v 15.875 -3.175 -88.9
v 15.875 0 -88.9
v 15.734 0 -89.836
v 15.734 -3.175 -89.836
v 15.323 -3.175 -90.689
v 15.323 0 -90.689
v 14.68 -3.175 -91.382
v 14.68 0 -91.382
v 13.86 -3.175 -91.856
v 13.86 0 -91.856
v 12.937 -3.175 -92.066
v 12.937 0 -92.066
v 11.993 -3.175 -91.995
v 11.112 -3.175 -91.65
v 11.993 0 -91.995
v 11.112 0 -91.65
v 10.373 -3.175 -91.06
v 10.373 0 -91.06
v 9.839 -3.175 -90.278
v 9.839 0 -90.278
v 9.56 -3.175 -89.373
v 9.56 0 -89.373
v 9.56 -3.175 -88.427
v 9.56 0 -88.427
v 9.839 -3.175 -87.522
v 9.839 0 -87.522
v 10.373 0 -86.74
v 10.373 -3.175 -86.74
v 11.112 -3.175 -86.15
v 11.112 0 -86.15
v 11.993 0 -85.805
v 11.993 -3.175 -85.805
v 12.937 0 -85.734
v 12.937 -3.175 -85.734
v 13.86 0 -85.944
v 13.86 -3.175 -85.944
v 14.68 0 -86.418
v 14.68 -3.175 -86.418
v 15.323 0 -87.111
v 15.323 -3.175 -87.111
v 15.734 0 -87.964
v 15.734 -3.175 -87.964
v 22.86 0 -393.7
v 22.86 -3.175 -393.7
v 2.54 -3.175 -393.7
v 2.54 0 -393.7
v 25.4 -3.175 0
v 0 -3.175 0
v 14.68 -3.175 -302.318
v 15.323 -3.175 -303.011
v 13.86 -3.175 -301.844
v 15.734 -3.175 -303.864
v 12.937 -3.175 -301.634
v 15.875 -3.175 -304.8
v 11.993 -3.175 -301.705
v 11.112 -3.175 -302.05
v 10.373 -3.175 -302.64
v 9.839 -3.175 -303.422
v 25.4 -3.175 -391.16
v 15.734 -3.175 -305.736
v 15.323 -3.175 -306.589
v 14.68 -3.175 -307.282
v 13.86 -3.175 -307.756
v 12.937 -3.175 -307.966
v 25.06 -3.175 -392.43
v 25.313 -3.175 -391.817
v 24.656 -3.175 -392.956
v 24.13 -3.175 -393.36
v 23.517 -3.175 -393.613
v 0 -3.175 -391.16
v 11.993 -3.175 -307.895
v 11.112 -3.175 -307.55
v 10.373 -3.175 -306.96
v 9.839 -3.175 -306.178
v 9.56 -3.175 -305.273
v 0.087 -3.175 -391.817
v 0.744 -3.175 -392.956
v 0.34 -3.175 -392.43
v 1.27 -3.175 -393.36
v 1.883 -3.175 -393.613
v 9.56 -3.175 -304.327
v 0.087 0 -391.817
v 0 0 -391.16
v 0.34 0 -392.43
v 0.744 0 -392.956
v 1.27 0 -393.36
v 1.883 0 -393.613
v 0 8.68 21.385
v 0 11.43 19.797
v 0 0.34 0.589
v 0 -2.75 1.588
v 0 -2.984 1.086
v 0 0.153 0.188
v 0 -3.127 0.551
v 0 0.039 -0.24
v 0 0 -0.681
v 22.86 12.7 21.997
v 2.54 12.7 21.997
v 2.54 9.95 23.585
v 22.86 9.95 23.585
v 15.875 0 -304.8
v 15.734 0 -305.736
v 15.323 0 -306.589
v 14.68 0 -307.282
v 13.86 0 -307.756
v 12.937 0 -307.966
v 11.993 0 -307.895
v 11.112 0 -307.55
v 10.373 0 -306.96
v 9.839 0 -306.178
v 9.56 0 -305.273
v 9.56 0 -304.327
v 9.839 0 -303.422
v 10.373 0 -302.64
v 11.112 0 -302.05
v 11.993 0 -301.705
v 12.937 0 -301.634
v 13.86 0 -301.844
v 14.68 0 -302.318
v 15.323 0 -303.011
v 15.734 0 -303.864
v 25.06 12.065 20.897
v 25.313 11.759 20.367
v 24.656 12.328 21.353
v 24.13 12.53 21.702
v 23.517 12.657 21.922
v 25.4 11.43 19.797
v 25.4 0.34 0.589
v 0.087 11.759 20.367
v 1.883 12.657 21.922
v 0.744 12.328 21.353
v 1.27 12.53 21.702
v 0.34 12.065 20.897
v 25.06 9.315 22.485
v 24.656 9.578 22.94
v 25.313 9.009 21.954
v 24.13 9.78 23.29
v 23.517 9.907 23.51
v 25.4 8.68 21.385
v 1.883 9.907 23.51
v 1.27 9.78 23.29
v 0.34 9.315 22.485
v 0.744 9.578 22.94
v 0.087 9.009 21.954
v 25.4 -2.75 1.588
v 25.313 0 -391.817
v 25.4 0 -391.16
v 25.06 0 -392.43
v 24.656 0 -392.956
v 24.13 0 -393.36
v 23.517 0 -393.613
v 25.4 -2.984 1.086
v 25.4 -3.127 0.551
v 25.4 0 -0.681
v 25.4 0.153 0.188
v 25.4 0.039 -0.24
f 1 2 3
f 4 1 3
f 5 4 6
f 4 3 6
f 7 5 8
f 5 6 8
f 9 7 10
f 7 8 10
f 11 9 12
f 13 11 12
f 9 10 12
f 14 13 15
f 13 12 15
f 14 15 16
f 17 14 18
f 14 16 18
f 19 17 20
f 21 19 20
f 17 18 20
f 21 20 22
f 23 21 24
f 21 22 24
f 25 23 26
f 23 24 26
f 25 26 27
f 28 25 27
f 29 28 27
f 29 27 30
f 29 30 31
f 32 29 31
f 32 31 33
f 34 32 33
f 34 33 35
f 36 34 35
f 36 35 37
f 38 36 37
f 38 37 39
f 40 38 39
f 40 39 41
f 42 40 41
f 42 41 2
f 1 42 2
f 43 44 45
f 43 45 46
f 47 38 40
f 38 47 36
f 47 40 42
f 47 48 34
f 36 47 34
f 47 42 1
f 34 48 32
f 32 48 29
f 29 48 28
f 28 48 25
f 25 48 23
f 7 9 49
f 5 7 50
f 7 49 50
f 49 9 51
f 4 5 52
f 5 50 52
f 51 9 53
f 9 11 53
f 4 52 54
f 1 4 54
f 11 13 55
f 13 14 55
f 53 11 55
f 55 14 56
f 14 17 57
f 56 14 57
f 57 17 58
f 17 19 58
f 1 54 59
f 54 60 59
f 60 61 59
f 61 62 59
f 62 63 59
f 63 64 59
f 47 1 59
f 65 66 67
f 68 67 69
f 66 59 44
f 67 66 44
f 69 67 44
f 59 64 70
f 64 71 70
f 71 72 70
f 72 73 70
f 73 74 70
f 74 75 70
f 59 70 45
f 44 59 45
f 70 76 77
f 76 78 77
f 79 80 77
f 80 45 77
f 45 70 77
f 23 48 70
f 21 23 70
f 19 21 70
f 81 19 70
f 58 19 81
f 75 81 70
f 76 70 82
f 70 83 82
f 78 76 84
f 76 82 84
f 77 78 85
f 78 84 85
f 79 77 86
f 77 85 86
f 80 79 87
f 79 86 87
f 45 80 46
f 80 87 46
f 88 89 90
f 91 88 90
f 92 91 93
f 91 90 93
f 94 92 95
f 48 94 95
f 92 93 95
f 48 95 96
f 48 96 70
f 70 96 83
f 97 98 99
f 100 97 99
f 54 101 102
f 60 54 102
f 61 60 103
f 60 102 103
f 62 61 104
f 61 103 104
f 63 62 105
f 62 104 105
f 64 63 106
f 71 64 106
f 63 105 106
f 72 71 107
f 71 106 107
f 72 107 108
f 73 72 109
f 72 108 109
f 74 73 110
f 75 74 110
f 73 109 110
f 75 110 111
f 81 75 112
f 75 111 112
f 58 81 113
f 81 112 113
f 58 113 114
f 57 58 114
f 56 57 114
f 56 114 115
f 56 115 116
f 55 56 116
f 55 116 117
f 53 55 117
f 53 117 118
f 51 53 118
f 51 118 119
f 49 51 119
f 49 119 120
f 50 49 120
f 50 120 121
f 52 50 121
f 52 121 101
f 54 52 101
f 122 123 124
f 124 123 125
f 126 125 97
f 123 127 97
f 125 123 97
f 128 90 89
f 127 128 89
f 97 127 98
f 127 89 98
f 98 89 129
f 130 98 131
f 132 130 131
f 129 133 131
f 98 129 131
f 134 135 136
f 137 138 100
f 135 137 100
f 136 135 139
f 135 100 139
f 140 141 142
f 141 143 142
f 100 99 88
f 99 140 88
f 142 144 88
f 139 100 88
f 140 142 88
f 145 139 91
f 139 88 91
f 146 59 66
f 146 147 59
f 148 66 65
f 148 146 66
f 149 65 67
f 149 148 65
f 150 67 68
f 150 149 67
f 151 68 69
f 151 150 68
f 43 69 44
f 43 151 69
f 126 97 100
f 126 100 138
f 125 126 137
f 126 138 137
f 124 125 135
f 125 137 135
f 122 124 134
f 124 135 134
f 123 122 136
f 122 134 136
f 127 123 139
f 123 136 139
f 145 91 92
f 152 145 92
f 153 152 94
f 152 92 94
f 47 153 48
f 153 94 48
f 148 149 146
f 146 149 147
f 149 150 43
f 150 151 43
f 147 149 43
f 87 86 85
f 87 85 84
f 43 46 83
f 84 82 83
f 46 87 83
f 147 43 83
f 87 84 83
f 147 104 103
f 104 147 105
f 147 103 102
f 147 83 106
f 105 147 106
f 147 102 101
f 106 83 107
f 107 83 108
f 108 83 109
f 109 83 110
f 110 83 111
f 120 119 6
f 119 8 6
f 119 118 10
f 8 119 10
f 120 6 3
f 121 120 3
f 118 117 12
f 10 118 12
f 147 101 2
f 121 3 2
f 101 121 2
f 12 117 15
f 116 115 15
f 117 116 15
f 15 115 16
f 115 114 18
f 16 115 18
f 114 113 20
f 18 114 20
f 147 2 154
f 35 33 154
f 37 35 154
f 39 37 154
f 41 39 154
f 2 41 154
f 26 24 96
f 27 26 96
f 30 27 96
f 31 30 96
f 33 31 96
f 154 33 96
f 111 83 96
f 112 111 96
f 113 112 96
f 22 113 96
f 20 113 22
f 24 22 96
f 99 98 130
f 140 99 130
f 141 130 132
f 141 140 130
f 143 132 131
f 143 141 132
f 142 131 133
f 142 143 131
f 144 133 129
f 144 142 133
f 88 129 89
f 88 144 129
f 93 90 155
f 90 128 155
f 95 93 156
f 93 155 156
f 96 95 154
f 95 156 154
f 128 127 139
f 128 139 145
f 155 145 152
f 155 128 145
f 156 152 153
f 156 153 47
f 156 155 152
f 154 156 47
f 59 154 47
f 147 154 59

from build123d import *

# Parameters (mm, degrees)
BOSS_EXTRUDE1_DEPTH = 25.4
SKETCH2_R           = 3.175
CUT_EXTRUDE1_DEPTH  = 4.175
FILLET1_R           = 2.54


with BuildPart() as part:
    # Sketch1 → Boss-Extrude1 (new body)
    with BuildSketch(Plane(origin=(0, 0, 0), x_dir=(0, 0, -1), z_dir=(1, 0, 0))):
        with BuildLine():
            Line((0, 0), (-21.997045256, 12.7))
            Line((-21.997045256, 12.7), (-23.584545256, 9.950369343))
            Line((-23.584545256, 9.950369343), (-1.5875, -2.749630657))
            ThreePointArc((-1.5875, -2.749630657), (-0.821750468, -3.066814498), (0, -3.175))
            Line((0, -3.175), (393.7, -3.175))
            Line((393.7, -3.175), (393.7, 0))
            Line((393.7, 0), (0, 0))
        make_face()
    extrude(amount=BOSS_EXTRUDE1_DEPTH)

    # Sketch2 → Cut-Extrude1 (cut, through all)
    with BuildSketch(Plane(origin=(0, 0, 0), x_dir=(1, 0, 0), z_dir=(0, 1, 0))):
        with Locations((12.7, 88.9)):
            Circle(SKETCH2_R)
        with Locations((12.7, 304.8)):
            Circle(SKETCH2_R)
    extrude(amount=-CUT_EXTRUDE1_DEPTH, mode=Mode.SUBTRACT)

    # Fillet1
    fillet1_edges = [part.edges().sort_by_distance(p)[0] for p in [
        (25.4, 11.325184671, 22.790795256),
        (12.7, 0, 0),
        (25.4, -1.5875, -393.7),
        (0, -1.5875, -393.7),
        (0, 11.325184671, 22.790795256),
    ]]
    fillet(fillet1_edges, radius=FILLET1_R)


solid = part.part
